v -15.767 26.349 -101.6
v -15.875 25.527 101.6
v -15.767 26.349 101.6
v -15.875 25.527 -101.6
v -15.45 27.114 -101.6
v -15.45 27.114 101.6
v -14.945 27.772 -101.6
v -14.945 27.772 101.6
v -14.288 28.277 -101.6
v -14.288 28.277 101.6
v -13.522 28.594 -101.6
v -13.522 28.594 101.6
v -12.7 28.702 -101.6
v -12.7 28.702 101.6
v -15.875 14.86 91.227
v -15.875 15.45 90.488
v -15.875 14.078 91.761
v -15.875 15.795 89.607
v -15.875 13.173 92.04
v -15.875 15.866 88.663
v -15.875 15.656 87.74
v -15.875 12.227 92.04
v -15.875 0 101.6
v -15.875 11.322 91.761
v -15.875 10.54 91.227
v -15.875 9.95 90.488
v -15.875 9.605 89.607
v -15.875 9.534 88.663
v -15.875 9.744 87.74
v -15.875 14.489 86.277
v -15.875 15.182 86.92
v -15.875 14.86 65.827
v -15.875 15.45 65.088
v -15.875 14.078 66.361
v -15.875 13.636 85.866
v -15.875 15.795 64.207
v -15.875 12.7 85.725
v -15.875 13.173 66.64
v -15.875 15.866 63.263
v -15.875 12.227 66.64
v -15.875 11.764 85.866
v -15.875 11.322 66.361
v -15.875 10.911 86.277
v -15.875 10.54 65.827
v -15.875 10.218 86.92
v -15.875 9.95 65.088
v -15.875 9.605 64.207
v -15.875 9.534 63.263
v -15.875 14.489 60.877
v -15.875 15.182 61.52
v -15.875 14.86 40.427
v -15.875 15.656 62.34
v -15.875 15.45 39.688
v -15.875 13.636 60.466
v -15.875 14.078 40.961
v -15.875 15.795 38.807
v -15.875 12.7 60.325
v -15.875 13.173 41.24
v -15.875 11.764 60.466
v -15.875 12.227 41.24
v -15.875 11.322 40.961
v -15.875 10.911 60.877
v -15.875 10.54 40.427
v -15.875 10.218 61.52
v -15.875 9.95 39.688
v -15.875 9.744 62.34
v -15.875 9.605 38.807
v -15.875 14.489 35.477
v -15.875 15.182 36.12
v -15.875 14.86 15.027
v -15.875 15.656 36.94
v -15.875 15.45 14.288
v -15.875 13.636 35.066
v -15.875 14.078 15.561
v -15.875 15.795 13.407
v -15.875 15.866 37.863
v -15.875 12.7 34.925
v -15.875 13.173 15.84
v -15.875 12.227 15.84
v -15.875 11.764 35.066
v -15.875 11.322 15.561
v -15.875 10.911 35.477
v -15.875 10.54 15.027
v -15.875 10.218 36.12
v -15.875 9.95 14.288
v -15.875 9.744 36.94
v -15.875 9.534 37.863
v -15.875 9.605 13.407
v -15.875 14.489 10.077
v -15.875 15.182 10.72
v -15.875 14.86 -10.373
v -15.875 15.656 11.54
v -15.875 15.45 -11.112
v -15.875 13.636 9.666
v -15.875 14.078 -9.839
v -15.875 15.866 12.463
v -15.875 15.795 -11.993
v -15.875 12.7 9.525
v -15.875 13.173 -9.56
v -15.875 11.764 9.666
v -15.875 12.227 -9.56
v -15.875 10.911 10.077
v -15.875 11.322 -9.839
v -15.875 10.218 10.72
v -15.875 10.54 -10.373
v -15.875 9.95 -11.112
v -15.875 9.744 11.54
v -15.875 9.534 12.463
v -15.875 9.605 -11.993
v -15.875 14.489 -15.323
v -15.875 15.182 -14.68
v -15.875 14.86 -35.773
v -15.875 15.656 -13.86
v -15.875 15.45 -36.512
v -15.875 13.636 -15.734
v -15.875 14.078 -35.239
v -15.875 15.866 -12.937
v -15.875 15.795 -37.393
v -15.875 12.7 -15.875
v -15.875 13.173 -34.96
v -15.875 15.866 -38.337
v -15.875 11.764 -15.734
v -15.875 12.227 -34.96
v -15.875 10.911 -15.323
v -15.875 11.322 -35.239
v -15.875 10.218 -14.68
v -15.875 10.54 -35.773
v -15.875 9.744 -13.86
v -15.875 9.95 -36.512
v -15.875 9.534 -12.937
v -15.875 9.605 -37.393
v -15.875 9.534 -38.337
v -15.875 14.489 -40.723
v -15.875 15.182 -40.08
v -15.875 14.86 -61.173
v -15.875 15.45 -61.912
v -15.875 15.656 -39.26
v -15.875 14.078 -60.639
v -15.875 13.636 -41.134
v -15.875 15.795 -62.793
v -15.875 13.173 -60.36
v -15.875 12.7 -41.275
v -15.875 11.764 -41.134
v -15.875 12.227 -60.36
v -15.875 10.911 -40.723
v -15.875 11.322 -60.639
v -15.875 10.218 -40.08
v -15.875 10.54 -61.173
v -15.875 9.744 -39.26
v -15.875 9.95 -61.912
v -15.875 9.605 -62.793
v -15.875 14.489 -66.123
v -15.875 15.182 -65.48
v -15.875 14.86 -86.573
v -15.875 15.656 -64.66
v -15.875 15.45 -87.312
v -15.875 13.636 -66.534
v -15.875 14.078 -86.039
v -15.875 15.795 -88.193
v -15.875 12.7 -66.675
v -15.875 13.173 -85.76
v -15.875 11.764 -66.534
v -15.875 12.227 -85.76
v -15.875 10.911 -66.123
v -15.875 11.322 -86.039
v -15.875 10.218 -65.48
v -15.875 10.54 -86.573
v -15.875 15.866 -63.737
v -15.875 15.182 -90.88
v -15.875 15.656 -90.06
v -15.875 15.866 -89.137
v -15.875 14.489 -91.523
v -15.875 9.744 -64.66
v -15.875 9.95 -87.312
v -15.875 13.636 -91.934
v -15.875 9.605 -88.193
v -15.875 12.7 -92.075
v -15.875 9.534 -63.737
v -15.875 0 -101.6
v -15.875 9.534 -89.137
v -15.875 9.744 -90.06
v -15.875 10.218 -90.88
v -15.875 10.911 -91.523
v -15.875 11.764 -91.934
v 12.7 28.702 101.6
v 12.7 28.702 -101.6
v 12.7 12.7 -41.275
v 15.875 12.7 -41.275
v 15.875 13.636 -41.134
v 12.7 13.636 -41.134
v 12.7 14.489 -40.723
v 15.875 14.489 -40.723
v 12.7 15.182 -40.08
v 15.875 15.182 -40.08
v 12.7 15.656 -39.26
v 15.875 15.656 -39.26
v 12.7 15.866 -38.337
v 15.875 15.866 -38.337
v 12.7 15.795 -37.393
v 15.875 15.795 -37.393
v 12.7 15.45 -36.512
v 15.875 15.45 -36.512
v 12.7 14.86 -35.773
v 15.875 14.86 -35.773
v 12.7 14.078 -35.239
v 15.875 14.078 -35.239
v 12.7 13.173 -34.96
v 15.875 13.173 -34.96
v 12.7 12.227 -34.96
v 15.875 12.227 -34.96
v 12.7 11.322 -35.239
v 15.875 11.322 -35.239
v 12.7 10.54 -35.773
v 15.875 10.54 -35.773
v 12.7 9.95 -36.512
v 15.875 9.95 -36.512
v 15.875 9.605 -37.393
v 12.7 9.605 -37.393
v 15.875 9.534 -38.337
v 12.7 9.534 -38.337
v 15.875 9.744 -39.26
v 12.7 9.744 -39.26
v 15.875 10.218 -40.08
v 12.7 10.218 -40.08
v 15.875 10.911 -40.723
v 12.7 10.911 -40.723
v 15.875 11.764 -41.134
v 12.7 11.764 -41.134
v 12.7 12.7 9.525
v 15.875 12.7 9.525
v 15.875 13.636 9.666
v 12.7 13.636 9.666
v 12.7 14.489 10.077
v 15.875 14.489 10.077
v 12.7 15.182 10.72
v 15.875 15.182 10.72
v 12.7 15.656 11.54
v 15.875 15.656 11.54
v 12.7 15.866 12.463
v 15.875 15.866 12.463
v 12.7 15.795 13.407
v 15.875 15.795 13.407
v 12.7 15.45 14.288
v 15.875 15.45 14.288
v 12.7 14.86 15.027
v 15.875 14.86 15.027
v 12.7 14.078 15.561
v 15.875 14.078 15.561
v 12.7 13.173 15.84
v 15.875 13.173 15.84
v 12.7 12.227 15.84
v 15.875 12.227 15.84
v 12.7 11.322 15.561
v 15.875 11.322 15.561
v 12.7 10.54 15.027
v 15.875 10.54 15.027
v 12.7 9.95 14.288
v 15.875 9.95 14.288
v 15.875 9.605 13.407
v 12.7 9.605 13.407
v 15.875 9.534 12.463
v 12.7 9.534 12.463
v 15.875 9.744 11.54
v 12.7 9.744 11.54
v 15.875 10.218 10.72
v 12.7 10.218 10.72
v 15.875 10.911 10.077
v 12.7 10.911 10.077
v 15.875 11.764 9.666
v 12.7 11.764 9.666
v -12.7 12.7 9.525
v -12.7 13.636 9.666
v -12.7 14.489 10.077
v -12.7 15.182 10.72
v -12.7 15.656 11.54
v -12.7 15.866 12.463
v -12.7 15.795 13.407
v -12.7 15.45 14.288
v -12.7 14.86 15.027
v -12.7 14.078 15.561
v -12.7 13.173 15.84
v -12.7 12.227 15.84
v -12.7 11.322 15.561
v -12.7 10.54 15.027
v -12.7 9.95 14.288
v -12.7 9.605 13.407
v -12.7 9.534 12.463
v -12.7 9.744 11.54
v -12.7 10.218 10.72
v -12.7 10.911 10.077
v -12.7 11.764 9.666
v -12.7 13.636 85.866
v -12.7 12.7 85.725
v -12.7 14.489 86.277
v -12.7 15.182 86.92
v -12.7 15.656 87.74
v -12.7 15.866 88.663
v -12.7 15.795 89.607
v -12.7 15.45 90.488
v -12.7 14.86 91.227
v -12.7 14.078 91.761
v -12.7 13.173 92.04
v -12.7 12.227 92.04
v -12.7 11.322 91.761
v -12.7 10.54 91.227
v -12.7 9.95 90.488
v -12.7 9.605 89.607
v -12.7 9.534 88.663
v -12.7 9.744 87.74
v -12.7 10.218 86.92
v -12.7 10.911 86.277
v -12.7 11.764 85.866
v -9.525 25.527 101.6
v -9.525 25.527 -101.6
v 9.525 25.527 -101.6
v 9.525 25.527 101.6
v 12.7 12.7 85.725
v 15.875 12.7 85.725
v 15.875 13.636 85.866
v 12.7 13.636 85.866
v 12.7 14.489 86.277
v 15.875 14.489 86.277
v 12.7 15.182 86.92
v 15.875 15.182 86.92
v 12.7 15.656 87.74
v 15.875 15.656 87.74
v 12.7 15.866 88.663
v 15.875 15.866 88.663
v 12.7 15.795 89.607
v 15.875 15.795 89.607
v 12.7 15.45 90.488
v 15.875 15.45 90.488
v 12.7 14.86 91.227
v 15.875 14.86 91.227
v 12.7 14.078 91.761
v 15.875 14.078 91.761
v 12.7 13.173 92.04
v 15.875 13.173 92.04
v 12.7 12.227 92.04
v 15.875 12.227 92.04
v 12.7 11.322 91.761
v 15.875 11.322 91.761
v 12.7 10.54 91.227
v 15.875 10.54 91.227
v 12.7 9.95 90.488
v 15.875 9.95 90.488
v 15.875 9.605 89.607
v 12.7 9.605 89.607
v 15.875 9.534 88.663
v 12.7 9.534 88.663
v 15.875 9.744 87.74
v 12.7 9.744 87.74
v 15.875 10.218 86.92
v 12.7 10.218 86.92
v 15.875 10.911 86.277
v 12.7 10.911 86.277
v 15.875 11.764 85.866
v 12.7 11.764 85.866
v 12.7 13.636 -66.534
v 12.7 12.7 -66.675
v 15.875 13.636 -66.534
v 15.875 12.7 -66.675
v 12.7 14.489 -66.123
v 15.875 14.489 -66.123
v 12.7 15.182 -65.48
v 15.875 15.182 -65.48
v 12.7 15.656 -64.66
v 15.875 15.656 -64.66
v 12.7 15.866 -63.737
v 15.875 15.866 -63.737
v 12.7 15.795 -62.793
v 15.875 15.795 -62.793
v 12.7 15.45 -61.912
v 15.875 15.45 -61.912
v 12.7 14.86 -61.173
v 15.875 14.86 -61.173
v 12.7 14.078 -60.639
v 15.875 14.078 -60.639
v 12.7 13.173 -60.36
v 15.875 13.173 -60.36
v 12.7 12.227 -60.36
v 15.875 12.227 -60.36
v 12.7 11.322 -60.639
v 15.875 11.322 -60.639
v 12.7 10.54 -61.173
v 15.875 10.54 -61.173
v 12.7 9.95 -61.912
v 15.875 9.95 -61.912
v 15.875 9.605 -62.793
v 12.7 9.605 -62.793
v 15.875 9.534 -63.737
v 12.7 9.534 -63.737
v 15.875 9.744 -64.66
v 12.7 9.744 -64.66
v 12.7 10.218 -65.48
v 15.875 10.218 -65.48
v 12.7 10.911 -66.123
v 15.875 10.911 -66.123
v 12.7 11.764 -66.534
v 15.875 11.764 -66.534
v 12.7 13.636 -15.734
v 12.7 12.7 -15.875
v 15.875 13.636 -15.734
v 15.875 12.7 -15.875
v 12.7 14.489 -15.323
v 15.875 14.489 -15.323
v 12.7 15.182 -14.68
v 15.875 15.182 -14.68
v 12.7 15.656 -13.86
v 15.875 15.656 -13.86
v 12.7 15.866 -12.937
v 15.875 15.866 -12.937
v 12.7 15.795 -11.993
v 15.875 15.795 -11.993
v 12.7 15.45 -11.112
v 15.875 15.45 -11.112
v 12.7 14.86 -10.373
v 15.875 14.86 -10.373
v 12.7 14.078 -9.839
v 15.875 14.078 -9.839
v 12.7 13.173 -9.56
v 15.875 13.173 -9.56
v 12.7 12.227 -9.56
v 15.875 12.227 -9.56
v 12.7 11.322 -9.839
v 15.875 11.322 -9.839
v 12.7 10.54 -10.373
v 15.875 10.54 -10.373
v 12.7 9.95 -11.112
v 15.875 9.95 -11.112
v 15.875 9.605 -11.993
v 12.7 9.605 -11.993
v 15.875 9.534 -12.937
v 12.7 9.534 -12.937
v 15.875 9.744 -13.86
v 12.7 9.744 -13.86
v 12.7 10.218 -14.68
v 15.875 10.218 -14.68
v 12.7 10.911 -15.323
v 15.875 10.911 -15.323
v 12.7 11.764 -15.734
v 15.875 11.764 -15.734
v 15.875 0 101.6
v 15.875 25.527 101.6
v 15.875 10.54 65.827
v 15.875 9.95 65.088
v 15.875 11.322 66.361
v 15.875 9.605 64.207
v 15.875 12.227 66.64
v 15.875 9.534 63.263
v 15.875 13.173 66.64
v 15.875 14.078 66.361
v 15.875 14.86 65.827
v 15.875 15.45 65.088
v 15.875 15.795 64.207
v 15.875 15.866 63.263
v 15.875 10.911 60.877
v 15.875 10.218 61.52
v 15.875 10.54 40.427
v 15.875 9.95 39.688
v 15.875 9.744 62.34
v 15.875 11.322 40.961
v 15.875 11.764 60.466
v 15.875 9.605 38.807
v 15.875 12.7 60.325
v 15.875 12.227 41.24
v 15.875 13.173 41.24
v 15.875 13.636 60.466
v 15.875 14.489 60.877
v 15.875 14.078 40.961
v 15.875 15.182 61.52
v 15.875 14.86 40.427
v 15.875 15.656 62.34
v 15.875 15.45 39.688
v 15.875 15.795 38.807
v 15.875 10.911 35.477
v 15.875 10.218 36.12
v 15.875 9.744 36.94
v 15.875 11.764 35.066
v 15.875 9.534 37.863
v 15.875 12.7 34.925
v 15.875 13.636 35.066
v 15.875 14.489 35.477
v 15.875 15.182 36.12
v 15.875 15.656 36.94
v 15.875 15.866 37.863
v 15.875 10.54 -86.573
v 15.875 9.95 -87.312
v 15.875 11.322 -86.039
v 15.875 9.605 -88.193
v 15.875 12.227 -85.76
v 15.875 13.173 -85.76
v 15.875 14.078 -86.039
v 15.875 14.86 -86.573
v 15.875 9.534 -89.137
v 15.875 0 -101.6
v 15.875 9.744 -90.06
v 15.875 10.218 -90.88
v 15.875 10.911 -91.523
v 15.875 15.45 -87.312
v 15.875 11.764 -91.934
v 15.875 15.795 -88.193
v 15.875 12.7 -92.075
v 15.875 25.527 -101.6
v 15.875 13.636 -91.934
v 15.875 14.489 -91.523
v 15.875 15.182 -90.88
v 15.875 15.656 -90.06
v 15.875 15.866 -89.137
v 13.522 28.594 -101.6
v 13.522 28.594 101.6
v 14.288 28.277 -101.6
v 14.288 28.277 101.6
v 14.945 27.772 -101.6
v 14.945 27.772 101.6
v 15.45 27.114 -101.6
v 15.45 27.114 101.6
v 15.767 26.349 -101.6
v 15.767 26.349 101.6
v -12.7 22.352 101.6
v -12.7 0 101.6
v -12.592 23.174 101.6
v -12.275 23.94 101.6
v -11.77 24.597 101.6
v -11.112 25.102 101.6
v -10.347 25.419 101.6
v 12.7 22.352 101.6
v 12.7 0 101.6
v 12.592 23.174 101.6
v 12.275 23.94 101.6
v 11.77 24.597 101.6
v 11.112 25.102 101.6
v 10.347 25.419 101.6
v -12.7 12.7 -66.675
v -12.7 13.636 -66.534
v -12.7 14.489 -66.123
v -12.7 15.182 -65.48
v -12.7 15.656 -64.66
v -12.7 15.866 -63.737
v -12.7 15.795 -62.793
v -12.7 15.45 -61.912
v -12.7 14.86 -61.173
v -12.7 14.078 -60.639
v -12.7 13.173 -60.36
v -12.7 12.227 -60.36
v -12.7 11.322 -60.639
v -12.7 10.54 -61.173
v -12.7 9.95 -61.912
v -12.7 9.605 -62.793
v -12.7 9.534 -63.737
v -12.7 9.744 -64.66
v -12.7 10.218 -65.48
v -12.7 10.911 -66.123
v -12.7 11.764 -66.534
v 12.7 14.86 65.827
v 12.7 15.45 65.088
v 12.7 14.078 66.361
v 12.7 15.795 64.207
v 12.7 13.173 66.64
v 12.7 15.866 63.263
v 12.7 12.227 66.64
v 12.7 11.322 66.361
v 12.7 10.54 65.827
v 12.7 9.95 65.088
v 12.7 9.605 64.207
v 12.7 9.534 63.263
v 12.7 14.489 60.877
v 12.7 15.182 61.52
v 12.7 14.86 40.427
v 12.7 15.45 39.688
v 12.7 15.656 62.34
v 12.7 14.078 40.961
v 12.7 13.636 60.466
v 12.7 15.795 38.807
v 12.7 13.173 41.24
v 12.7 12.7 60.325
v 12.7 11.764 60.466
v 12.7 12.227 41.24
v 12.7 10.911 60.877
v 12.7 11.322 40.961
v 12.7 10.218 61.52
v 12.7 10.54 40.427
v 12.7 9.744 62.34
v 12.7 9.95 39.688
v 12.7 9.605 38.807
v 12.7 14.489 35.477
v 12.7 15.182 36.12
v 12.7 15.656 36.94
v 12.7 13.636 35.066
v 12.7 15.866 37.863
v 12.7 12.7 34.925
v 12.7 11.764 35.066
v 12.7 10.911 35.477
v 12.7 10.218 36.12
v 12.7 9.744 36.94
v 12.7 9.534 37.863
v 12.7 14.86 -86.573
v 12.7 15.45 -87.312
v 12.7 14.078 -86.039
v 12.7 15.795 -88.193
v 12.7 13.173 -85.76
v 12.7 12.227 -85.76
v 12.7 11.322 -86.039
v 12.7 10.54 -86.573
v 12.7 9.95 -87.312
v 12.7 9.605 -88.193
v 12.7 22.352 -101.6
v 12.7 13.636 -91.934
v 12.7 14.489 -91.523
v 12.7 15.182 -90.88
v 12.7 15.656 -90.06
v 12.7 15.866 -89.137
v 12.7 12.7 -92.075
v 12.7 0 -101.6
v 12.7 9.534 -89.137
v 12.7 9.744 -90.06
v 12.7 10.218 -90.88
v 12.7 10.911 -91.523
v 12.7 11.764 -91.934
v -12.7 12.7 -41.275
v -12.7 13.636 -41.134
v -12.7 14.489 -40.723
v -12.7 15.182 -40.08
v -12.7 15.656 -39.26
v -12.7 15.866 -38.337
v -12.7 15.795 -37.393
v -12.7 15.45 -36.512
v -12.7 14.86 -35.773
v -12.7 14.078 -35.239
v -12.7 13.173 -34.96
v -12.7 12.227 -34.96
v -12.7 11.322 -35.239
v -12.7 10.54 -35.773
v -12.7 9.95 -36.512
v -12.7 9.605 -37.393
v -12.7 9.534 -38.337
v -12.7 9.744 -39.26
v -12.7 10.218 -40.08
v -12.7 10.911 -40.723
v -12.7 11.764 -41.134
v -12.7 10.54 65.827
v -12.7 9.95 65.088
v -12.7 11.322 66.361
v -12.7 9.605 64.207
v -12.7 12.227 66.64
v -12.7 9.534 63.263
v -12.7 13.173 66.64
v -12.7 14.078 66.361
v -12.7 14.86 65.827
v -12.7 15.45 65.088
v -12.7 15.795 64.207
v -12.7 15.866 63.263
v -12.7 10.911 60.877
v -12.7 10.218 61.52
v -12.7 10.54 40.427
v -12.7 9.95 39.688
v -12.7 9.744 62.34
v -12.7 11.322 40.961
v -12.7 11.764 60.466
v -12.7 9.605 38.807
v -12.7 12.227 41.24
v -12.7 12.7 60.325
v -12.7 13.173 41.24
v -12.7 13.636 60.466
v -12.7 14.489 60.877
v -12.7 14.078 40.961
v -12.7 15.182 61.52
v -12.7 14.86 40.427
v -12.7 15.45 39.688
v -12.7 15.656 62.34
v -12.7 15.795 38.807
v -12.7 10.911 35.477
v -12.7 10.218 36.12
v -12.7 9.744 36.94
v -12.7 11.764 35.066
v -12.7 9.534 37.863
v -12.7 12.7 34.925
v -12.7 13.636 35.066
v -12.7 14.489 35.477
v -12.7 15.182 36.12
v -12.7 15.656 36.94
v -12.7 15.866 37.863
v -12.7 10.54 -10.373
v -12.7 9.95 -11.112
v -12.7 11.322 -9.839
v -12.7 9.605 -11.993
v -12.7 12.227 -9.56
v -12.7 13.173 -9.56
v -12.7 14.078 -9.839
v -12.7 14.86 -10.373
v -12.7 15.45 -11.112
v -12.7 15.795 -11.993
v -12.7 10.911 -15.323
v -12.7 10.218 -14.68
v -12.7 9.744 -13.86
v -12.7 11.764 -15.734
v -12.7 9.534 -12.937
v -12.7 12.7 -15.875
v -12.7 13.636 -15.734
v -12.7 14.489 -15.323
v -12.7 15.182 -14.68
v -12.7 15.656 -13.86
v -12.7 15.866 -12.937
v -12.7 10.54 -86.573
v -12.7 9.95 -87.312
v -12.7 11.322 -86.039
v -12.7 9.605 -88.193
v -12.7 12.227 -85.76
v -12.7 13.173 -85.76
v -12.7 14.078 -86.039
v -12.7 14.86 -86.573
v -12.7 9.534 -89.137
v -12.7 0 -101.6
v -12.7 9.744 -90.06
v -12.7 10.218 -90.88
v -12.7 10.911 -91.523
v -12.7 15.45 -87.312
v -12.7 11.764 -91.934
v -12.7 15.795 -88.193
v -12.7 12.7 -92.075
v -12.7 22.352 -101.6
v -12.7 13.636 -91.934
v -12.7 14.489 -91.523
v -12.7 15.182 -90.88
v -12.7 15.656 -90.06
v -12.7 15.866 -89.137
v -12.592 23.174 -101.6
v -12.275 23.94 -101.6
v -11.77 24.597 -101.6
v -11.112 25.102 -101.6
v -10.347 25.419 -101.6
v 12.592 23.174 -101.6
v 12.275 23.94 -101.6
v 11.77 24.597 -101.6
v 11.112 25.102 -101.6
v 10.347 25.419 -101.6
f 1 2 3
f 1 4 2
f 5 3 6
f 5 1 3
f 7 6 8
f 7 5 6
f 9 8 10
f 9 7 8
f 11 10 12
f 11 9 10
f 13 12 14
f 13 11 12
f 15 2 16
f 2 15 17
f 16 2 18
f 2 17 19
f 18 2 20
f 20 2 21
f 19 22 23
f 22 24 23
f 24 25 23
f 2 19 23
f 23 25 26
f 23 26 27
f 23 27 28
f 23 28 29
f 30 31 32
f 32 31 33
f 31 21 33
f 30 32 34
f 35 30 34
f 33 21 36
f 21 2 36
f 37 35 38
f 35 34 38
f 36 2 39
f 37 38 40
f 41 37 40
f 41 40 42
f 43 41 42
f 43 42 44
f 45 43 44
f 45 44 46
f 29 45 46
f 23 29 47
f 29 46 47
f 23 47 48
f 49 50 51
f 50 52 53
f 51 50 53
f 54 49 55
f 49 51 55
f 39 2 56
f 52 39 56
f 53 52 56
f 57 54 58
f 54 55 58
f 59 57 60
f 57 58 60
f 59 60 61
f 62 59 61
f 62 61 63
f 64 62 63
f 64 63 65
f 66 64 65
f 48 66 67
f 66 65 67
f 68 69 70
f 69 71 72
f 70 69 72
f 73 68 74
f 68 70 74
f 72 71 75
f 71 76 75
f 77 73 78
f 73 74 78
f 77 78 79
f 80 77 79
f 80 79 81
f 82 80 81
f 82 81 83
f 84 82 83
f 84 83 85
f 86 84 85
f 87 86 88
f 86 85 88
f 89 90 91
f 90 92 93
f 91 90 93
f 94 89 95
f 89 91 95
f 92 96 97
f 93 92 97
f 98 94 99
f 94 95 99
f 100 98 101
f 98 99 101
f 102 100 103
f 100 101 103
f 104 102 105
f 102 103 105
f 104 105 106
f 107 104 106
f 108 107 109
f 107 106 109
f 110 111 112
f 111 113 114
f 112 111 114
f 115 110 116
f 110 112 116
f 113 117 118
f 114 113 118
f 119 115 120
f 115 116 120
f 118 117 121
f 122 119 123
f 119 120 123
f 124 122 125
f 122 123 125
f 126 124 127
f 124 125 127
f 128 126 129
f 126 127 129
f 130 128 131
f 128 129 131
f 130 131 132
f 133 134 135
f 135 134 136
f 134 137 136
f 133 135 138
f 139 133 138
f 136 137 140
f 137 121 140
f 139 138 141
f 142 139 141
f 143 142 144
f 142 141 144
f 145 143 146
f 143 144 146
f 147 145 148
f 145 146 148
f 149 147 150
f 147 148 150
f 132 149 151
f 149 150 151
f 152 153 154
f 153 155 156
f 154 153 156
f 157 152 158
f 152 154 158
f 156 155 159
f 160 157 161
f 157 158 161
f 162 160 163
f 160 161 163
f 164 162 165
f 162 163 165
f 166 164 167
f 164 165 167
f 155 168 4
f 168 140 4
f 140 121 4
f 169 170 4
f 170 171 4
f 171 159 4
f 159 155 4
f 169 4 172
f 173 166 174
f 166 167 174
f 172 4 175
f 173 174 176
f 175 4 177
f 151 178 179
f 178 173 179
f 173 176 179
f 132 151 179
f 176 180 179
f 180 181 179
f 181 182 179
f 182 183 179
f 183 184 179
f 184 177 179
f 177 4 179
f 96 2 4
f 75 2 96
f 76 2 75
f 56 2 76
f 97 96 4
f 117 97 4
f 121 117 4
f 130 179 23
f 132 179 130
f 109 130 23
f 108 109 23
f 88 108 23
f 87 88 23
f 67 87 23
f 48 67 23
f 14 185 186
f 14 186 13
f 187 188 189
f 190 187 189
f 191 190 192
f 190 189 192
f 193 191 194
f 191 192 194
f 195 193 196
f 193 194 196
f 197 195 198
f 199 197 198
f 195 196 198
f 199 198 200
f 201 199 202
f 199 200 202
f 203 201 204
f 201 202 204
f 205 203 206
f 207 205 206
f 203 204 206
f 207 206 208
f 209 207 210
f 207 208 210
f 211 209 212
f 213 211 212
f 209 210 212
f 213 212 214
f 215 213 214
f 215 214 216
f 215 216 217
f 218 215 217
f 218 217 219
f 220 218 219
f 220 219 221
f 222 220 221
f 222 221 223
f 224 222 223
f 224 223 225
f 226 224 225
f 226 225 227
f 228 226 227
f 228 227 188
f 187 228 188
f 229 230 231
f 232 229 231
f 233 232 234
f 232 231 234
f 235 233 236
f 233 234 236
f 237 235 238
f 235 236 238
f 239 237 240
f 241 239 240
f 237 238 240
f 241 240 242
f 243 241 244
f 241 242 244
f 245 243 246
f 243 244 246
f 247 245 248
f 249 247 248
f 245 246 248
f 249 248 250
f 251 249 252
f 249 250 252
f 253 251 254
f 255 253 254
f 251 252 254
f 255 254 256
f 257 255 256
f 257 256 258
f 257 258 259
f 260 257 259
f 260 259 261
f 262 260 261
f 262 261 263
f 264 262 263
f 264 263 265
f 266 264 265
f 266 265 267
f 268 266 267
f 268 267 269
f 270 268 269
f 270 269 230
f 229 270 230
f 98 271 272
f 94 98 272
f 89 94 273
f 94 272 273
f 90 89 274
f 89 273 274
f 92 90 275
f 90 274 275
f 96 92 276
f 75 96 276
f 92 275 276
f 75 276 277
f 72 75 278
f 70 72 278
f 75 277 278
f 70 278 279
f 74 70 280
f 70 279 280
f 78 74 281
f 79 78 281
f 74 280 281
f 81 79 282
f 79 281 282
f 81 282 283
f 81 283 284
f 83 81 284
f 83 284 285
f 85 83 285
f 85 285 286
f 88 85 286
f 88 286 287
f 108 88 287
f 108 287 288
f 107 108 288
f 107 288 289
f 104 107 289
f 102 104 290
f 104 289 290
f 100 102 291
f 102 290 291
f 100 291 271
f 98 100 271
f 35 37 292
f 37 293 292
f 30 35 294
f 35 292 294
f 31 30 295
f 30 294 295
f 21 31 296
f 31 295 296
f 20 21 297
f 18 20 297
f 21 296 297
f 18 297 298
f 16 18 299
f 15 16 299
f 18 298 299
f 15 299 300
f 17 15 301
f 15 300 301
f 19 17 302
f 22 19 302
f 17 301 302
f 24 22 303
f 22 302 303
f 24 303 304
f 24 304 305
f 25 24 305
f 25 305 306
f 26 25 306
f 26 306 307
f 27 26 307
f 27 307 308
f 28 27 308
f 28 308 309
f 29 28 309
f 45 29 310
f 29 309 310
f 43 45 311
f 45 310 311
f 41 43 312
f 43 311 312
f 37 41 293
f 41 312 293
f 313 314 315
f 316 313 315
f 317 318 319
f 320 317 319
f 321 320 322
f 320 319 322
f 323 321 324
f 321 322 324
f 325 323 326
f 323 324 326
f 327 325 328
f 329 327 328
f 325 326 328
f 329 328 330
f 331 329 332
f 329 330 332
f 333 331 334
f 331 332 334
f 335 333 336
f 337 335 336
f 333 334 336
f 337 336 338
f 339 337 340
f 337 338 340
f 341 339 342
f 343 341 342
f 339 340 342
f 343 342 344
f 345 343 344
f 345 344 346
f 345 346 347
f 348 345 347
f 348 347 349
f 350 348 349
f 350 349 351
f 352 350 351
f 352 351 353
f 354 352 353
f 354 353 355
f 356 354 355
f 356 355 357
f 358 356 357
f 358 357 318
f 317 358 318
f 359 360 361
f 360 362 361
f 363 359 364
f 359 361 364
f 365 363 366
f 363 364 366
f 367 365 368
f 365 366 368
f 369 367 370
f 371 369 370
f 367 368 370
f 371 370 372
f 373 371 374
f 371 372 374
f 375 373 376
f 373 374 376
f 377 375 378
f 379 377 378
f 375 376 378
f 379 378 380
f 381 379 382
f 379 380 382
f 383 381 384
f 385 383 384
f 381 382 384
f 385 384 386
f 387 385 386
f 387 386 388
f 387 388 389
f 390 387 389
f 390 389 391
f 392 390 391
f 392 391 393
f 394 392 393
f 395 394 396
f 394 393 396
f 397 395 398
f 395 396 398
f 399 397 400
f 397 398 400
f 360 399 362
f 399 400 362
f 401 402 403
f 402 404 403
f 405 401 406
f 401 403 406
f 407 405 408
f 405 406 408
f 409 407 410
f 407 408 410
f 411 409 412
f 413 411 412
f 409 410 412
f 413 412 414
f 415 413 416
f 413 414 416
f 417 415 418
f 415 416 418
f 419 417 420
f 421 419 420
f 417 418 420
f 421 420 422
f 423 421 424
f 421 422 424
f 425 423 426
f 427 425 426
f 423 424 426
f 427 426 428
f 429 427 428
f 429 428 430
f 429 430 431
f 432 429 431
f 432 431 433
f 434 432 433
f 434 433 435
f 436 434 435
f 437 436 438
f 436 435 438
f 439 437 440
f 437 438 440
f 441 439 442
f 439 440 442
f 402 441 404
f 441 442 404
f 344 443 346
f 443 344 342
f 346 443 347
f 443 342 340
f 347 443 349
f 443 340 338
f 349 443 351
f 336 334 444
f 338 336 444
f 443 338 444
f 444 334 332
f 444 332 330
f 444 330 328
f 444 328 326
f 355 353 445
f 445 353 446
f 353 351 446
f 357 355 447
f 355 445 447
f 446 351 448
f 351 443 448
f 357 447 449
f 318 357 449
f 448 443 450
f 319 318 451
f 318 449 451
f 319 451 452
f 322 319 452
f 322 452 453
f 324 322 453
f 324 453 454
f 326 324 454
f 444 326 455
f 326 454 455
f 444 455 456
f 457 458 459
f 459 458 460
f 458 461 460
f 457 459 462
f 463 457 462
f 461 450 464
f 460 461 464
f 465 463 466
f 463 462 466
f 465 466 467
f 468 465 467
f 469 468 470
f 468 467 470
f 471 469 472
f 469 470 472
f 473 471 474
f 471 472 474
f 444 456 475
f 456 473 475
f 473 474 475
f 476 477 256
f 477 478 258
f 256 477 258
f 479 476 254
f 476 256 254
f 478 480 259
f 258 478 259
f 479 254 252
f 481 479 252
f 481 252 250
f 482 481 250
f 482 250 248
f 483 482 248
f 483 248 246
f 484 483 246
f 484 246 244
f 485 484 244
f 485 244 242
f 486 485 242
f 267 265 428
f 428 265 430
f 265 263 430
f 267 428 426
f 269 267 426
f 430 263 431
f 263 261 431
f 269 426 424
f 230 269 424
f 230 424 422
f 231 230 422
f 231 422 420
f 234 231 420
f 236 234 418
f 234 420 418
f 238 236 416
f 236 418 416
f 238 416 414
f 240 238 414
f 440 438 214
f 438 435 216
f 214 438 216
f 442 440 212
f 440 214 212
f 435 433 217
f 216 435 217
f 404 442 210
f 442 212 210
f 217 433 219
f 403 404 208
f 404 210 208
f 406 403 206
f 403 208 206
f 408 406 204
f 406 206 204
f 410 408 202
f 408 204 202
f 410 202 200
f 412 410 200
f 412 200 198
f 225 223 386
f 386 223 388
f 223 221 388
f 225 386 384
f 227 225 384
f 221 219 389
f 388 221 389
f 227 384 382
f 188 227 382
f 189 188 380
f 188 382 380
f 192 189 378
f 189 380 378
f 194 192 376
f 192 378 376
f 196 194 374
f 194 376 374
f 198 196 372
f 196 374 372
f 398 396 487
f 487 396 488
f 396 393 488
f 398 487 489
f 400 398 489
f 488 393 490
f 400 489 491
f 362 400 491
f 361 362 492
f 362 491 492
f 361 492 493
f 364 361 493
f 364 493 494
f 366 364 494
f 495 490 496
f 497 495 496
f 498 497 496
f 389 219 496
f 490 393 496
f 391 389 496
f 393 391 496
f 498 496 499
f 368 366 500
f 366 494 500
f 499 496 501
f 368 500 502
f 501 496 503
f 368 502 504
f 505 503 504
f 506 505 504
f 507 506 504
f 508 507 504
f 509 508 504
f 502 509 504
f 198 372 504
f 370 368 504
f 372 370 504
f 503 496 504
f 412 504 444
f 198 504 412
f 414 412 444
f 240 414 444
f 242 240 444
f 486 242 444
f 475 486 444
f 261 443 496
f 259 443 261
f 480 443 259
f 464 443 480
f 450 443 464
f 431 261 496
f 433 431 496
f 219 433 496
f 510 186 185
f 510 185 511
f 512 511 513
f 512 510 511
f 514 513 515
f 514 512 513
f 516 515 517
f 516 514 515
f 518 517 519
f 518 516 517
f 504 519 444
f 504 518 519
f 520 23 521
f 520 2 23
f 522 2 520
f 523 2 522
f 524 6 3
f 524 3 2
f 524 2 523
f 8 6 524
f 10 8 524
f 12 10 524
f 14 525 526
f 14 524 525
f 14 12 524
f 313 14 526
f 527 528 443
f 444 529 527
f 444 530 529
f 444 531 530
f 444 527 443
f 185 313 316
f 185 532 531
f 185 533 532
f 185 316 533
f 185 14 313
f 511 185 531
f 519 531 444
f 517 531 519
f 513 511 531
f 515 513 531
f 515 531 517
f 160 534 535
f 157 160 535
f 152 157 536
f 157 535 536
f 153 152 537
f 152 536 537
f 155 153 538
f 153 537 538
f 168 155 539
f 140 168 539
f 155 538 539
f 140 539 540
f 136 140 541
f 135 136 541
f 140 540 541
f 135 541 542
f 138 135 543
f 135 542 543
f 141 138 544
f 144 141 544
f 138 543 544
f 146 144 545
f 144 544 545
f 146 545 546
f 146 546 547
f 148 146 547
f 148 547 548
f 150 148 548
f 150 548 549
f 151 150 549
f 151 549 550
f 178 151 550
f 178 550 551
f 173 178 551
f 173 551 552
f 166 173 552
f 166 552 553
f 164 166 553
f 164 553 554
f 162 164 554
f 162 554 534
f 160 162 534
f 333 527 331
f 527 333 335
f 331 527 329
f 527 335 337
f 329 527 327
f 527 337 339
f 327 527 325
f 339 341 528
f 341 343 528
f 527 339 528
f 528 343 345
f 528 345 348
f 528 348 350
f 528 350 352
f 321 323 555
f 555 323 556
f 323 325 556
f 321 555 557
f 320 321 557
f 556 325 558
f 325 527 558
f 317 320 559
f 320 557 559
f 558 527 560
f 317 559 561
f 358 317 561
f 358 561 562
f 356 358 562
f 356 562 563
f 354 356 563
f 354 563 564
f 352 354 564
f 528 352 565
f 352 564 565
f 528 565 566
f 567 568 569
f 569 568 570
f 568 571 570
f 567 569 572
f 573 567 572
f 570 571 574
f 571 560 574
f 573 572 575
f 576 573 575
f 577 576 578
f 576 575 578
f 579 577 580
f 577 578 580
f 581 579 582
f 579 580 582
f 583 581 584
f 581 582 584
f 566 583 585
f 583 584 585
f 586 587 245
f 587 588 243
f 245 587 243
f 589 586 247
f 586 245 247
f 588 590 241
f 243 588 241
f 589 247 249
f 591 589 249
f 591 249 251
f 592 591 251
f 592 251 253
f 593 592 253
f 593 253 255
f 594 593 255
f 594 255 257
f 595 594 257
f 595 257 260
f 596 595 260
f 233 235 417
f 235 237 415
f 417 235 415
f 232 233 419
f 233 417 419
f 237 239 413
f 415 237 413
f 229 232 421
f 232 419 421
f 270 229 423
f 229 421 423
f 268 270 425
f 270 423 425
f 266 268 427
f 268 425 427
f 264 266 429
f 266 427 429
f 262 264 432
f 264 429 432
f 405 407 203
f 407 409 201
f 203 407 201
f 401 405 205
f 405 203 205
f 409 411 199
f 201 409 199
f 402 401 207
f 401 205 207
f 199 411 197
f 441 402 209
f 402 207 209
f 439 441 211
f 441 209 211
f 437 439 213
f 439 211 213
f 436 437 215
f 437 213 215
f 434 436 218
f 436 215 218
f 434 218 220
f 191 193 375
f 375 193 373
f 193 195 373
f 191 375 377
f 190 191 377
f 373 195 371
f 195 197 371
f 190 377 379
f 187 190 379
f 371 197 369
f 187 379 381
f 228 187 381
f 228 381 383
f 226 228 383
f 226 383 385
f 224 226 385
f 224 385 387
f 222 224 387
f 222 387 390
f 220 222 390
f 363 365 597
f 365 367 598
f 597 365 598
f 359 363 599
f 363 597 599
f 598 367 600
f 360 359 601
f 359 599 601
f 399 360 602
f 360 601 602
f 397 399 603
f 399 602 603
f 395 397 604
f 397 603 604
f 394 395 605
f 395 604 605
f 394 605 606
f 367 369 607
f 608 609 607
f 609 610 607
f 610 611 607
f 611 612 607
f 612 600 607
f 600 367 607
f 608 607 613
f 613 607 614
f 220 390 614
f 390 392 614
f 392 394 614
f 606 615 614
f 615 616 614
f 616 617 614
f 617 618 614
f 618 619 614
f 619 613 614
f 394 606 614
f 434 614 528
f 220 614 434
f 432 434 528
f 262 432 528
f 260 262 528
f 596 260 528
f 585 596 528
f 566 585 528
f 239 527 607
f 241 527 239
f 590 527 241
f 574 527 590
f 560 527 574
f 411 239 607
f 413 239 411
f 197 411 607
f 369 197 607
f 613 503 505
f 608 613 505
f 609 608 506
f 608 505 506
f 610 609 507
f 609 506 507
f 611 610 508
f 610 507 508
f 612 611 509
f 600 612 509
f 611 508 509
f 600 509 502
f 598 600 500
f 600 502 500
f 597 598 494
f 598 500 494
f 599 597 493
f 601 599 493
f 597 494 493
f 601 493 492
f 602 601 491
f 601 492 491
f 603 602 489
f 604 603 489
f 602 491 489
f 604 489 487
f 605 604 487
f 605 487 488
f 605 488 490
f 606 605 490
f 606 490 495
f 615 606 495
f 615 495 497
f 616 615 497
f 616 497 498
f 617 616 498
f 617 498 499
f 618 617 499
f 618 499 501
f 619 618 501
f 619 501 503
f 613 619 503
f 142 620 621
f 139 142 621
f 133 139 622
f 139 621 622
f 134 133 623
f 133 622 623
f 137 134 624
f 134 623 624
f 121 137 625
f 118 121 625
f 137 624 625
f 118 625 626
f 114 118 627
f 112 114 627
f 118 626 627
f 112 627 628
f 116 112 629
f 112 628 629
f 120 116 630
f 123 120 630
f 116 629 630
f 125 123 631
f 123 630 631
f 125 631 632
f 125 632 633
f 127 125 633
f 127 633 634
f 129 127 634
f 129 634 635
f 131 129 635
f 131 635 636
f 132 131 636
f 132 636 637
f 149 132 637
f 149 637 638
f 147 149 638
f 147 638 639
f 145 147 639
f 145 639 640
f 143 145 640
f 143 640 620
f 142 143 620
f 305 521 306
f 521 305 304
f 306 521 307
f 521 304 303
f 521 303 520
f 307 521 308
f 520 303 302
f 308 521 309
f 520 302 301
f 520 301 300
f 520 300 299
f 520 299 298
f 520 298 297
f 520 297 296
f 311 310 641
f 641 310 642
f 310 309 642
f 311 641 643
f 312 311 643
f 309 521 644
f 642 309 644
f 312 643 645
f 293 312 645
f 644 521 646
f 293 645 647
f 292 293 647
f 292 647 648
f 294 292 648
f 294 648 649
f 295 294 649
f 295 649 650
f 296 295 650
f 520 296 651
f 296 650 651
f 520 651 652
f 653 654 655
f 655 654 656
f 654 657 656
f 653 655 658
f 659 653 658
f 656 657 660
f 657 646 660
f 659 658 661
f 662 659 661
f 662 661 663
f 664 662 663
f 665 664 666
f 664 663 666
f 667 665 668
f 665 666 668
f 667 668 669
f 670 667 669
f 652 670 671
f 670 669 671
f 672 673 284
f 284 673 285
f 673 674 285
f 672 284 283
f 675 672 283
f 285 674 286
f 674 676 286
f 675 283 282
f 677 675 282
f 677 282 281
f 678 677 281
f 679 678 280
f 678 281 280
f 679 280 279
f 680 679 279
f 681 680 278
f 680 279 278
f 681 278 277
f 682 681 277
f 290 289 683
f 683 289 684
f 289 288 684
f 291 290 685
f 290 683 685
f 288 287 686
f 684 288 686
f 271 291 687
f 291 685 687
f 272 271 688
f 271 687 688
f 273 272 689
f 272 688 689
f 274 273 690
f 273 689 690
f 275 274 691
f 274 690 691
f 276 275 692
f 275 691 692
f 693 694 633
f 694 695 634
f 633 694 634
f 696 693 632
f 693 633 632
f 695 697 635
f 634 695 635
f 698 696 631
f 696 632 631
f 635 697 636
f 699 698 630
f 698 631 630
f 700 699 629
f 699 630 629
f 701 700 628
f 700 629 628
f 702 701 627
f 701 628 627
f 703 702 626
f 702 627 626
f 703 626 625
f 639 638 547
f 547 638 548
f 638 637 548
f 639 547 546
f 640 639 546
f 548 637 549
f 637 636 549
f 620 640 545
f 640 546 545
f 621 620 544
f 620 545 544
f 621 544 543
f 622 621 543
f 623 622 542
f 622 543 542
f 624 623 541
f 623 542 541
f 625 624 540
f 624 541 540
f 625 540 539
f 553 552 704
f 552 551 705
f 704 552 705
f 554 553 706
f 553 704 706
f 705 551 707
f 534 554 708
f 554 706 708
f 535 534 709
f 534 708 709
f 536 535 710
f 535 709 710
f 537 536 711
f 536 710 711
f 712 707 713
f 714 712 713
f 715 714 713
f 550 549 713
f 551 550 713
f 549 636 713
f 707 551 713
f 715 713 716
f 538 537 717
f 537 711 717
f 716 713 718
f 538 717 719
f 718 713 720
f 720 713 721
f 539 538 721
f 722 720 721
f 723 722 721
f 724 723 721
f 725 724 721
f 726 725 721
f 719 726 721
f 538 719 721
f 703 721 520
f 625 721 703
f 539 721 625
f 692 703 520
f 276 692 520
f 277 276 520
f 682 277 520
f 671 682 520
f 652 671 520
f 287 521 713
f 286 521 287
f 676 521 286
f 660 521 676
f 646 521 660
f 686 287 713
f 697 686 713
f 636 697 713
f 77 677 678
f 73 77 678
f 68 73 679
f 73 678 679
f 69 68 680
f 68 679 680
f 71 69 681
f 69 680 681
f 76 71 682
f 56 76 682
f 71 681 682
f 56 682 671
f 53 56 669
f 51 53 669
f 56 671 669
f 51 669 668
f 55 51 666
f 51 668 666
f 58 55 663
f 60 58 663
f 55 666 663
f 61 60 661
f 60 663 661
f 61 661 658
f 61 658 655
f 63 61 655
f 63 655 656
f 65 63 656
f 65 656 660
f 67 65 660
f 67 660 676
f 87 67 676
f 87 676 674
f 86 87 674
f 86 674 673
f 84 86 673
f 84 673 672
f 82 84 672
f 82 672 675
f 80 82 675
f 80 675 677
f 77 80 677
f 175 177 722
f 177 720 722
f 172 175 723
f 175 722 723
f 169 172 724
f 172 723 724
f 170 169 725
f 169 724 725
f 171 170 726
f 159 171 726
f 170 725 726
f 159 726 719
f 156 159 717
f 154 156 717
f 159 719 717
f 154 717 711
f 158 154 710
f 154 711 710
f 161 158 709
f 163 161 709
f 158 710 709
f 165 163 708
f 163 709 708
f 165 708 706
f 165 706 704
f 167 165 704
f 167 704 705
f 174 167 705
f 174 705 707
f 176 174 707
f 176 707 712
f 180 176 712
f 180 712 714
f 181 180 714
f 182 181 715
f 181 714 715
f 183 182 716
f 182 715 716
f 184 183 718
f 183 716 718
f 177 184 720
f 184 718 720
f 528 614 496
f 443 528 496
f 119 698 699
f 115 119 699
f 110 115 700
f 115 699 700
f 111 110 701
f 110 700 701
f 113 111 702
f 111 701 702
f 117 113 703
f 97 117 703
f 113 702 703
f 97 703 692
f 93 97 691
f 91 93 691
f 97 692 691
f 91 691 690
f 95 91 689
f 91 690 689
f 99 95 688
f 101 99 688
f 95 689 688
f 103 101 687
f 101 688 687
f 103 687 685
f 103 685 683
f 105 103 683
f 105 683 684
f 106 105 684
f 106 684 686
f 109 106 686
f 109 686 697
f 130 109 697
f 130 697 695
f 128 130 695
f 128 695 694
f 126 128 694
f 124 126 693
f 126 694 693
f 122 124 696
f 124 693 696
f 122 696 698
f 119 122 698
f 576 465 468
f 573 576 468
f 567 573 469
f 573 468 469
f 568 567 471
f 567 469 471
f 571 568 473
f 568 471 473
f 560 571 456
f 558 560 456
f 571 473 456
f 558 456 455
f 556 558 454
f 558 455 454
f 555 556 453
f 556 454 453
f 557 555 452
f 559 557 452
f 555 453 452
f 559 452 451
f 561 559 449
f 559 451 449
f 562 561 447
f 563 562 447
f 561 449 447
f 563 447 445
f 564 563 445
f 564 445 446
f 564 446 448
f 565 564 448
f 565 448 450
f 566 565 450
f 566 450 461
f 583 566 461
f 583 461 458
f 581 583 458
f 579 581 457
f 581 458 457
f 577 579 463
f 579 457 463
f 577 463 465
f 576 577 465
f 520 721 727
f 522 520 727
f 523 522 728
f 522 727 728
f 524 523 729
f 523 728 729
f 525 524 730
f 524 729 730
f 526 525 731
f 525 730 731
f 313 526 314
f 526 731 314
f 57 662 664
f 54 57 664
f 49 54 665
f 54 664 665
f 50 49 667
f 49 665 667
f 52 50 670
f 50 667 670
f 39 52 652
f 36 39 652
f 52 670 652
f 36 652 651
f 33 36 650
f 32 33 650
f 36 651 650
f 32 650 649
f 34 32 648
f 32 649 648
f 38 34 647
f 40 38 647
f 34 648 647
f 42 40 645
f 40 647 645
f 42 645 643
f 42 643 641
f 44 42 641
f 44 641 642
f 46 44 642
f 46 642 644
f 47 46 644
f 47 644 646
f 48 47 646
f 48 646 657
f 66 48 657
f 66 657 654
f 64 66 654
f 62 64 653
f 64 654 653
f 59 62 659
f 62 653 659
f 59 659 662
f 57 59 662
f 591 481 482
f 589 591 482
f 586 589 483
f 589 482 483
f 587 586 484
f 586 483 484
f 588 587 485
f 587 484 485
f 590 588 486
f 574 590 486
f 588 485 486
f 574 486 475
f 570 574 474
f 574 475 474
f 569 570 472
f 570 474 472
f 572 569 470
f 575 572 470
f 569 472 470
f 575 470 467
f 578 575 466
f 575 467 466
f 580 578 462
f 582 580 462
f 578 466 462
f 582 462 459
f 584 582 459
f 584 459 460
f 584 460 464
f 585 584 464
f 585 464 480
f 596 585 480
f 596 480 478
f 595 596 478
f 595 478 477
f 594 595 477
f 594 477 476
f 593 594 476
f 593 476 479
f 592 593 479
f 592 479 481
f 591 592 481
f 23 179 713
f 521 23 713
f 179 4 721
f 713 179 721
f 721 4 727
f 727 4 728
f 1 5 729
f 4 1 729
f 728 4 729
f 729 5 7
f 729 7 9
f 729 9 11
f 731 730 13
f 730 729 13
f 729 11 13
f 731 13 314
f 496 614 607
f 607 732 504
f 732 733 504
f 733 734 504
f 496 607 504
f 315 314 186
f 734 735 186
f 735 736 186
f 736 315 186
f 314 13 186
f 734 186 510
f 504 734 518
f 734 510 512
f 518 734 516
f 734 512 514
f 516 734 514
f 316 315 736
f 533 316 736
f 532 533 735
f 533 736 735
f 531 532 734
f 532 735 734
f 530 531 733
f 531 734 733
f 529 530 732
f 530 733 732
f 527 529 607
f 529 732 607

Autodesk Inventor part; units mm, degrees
ref_plane "YZ Plane" through (0, 0, 0) normal (1, 0, 0) x (0, 1, 0)
ref_plane "XZ Plane" through (0, 0, 0) normal (0, 1, 0) x (-1, 0, 0)
ref_plane "XY Plane" through (0, 0, 0) normal (0, 0, 1) x (1, 0, 0)
sketch "Sketch1" plane through (0, 0, 0) normal (0, 0, 1) x (1, 0, 0)
  line L0 (-15.875, 0) -> (-12.7, 0)
  line L1 (-12.7, 0) -> (-12.7, 22.352)
  line L2 (-9.525, 25.527) -> (9.525, 25.527)
  line L3 (12.7, 22.352) -> (12.7, 0)
  line L4 (12.7, 0) -> (15.875, 0)
  line L5 (15.875, 0) -> (15.875, 25.527)
  line L6 (12.7, 28.702) -> (-12.7, 28.702)
  line L7 (-15.875, 25.527) -> (-15.875, 0)
  arc A0 (-9.525, 25.527) -> (-12.7, 22.352) centre (-9.525, 22.352) ccw
  arc A1 (12.7, 22.352) -> (9.525, 25.527) centre (9.525, 22.352) ccw
  arc A2 (-12.7, 28.702) -> (-15.875, 25.527) centre (-12.7, 25.527) ccw
  arc A3 (15.875, 25.527) -> (12.7, 28.702) centre (12.7, 25.527) ccw
  line L8 (0, 35.2315) -> (0, -5.8719) projected
  point P0 (0, 0)
  dimension "d0" = 28.702
  dimension "d1" = 31.75
  dimension "d2" = 3.175
  dimension "d3" = 3.175
  dimension "d4" = 3.175
extrude "Extrusion1" add sketch "Sketch1" along normal mid plane 203.2
sketch "Sketch4" plane through (15.875, 0, 101.6) normal (1, 0, 0) x (0, 0, -1)
  line L0 (101.6, -5.7404) -> (101.6, 34.4424) construction
  line L1 (-40.64, 0) -> (243.84, 0) construction
  circle A0 centre (114.3, 12.7) radius 3.175
  point P0 (101.6, 0)
  dimension "d34" = 12.7
  dimension "d35" = 12.7
  dimension "d36" = 6.35
extrude "Extrusion4" cut sketch "Sketch4" against normal up to surface (31.75 mm away)
pattern_linear "Rectangular Pattern3" count 15 spacing 25.4 along (0, 0, 1) count 15 spacing 25.4 along (0, 0, -1) of "Extrusion4"
equation "\"d5\" = Support2Length"
equation "\"Support2Length\" = 203.2"
properties part number "NSupportChannel2" material "Aluminum 6061"
